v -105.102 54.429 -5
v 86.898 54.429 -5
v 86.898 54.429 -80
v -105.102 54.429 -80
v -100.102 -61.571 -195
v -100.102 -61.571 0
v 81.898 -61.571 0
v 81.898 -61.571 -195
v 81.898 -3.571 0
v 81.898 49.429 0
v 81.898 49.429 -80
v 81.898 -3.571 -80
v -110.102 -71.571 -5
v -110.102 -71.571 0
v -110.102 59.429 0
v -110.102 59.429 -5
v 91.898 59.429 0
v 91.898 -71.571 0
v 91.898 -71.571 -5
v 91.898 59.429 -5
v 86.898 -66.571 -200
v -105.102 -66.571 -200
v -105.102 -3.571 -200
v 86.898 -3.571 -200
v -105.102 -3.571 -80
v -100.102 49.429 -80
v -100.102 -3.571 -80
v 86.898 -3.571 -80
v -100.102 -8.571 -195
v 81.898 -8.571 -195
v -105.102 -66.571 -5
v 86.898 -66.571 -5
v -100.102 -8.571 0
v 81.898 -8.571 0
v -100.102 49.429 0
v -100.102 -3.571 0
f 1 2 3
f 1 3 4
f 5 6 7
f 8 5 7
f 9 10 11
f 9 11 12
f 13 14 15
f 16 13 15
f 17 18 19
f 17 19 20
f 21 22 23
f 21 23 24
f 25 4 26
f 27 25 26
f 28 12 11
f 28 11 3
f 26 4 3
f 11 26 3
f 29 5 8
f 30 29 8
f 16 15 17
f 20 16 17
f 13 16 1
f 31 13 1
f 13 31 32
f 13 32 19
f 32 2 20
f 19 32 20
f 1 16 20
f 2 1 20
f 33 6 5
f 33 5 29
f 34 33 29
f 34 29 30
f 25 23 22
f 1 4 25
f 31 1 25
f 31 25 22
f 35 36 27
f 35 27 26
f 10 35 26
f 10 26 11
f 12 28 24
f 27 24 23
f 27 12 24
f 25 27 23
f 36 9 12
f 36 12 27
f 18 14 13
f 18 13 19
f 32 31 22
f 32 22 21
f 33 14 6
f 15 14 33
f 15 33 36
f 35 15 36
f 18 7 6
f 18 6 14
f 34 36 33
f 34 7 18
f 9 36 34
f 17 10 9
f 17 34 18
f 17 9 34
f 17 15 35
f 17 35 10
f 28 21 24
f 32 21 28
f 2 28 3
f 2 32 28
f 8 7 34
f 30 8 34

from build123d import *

# Parameters (mm, degrees)
F0_W     = 182
F0_H     = 53
F1_DEPTH = 200
F2_DEPTH = 80
F3_W     = 182
F3_H     = 53
F4_DEPTH = 5
F0_W_2   = 202
F0_H_2   = 131
F5_DEPTH = 5


with BuildPart() as f1:
    # F0 (on Top) → F1 (new body)
    with BuildSketch(Plane.XY):
        Polygon((81.89805, -3.570612), (-100.10195, -3.570612), (-105.10195, -3.570612), (-105.10195, -66.570612), (86.89805, -66.570612), (86.89805, -3.570612), align=None)
        with Locations((-9.10195, -35.070612)):
            Rectangle(F0_W, F0_H, mode=Mode.SUBTRACT)
    extrude(amount=-F1_DEPTH)

    # F0 (on Top) → F2 (join)
    with BuildSketch(Plane.XY):
        Polygon((-100.10195, -3.570612), (-100.10195, 49.429388), (81.89805, 49.429388), (81.89805, -3.570612), (86.89805, -3.570612), (86.89805, 54.429388), (-105.10195, 54.429388), (-105.10195, -3.570612), align=None)
    extrude(amount=-F2_DEPTH)

    # F3 (on face) → F4 (join)
    with BuildSketch(Plane(origin=(0, 0, -200), x_dir=(1, 0, 0), z_dir=(0, 0, -1))):
        with Locations((-9.10195, 35.070612)):
            Rectangle(F3_W, F3_H)
    extrude(amount=-F4_DEPTH)

    # F0 (on Top) → F5 (join)
    with BuildSketch(Plane.XY):
        with Locations((-9.10195, -6.070612)):
            Rectangle(F0_W_2, F0_H_2)
        Polygon((-105.10195, -66.570612), (-105.10195, -3.570612), (-105.10195, 54.429388), (86.89805, 54.429388), (86.89805, -3.570612), (86.89805, -66.570612), align=None, mode=Mode.SUBTRACT)
    extrude(amount=-F5_DEPTH)


solid = f1.part
